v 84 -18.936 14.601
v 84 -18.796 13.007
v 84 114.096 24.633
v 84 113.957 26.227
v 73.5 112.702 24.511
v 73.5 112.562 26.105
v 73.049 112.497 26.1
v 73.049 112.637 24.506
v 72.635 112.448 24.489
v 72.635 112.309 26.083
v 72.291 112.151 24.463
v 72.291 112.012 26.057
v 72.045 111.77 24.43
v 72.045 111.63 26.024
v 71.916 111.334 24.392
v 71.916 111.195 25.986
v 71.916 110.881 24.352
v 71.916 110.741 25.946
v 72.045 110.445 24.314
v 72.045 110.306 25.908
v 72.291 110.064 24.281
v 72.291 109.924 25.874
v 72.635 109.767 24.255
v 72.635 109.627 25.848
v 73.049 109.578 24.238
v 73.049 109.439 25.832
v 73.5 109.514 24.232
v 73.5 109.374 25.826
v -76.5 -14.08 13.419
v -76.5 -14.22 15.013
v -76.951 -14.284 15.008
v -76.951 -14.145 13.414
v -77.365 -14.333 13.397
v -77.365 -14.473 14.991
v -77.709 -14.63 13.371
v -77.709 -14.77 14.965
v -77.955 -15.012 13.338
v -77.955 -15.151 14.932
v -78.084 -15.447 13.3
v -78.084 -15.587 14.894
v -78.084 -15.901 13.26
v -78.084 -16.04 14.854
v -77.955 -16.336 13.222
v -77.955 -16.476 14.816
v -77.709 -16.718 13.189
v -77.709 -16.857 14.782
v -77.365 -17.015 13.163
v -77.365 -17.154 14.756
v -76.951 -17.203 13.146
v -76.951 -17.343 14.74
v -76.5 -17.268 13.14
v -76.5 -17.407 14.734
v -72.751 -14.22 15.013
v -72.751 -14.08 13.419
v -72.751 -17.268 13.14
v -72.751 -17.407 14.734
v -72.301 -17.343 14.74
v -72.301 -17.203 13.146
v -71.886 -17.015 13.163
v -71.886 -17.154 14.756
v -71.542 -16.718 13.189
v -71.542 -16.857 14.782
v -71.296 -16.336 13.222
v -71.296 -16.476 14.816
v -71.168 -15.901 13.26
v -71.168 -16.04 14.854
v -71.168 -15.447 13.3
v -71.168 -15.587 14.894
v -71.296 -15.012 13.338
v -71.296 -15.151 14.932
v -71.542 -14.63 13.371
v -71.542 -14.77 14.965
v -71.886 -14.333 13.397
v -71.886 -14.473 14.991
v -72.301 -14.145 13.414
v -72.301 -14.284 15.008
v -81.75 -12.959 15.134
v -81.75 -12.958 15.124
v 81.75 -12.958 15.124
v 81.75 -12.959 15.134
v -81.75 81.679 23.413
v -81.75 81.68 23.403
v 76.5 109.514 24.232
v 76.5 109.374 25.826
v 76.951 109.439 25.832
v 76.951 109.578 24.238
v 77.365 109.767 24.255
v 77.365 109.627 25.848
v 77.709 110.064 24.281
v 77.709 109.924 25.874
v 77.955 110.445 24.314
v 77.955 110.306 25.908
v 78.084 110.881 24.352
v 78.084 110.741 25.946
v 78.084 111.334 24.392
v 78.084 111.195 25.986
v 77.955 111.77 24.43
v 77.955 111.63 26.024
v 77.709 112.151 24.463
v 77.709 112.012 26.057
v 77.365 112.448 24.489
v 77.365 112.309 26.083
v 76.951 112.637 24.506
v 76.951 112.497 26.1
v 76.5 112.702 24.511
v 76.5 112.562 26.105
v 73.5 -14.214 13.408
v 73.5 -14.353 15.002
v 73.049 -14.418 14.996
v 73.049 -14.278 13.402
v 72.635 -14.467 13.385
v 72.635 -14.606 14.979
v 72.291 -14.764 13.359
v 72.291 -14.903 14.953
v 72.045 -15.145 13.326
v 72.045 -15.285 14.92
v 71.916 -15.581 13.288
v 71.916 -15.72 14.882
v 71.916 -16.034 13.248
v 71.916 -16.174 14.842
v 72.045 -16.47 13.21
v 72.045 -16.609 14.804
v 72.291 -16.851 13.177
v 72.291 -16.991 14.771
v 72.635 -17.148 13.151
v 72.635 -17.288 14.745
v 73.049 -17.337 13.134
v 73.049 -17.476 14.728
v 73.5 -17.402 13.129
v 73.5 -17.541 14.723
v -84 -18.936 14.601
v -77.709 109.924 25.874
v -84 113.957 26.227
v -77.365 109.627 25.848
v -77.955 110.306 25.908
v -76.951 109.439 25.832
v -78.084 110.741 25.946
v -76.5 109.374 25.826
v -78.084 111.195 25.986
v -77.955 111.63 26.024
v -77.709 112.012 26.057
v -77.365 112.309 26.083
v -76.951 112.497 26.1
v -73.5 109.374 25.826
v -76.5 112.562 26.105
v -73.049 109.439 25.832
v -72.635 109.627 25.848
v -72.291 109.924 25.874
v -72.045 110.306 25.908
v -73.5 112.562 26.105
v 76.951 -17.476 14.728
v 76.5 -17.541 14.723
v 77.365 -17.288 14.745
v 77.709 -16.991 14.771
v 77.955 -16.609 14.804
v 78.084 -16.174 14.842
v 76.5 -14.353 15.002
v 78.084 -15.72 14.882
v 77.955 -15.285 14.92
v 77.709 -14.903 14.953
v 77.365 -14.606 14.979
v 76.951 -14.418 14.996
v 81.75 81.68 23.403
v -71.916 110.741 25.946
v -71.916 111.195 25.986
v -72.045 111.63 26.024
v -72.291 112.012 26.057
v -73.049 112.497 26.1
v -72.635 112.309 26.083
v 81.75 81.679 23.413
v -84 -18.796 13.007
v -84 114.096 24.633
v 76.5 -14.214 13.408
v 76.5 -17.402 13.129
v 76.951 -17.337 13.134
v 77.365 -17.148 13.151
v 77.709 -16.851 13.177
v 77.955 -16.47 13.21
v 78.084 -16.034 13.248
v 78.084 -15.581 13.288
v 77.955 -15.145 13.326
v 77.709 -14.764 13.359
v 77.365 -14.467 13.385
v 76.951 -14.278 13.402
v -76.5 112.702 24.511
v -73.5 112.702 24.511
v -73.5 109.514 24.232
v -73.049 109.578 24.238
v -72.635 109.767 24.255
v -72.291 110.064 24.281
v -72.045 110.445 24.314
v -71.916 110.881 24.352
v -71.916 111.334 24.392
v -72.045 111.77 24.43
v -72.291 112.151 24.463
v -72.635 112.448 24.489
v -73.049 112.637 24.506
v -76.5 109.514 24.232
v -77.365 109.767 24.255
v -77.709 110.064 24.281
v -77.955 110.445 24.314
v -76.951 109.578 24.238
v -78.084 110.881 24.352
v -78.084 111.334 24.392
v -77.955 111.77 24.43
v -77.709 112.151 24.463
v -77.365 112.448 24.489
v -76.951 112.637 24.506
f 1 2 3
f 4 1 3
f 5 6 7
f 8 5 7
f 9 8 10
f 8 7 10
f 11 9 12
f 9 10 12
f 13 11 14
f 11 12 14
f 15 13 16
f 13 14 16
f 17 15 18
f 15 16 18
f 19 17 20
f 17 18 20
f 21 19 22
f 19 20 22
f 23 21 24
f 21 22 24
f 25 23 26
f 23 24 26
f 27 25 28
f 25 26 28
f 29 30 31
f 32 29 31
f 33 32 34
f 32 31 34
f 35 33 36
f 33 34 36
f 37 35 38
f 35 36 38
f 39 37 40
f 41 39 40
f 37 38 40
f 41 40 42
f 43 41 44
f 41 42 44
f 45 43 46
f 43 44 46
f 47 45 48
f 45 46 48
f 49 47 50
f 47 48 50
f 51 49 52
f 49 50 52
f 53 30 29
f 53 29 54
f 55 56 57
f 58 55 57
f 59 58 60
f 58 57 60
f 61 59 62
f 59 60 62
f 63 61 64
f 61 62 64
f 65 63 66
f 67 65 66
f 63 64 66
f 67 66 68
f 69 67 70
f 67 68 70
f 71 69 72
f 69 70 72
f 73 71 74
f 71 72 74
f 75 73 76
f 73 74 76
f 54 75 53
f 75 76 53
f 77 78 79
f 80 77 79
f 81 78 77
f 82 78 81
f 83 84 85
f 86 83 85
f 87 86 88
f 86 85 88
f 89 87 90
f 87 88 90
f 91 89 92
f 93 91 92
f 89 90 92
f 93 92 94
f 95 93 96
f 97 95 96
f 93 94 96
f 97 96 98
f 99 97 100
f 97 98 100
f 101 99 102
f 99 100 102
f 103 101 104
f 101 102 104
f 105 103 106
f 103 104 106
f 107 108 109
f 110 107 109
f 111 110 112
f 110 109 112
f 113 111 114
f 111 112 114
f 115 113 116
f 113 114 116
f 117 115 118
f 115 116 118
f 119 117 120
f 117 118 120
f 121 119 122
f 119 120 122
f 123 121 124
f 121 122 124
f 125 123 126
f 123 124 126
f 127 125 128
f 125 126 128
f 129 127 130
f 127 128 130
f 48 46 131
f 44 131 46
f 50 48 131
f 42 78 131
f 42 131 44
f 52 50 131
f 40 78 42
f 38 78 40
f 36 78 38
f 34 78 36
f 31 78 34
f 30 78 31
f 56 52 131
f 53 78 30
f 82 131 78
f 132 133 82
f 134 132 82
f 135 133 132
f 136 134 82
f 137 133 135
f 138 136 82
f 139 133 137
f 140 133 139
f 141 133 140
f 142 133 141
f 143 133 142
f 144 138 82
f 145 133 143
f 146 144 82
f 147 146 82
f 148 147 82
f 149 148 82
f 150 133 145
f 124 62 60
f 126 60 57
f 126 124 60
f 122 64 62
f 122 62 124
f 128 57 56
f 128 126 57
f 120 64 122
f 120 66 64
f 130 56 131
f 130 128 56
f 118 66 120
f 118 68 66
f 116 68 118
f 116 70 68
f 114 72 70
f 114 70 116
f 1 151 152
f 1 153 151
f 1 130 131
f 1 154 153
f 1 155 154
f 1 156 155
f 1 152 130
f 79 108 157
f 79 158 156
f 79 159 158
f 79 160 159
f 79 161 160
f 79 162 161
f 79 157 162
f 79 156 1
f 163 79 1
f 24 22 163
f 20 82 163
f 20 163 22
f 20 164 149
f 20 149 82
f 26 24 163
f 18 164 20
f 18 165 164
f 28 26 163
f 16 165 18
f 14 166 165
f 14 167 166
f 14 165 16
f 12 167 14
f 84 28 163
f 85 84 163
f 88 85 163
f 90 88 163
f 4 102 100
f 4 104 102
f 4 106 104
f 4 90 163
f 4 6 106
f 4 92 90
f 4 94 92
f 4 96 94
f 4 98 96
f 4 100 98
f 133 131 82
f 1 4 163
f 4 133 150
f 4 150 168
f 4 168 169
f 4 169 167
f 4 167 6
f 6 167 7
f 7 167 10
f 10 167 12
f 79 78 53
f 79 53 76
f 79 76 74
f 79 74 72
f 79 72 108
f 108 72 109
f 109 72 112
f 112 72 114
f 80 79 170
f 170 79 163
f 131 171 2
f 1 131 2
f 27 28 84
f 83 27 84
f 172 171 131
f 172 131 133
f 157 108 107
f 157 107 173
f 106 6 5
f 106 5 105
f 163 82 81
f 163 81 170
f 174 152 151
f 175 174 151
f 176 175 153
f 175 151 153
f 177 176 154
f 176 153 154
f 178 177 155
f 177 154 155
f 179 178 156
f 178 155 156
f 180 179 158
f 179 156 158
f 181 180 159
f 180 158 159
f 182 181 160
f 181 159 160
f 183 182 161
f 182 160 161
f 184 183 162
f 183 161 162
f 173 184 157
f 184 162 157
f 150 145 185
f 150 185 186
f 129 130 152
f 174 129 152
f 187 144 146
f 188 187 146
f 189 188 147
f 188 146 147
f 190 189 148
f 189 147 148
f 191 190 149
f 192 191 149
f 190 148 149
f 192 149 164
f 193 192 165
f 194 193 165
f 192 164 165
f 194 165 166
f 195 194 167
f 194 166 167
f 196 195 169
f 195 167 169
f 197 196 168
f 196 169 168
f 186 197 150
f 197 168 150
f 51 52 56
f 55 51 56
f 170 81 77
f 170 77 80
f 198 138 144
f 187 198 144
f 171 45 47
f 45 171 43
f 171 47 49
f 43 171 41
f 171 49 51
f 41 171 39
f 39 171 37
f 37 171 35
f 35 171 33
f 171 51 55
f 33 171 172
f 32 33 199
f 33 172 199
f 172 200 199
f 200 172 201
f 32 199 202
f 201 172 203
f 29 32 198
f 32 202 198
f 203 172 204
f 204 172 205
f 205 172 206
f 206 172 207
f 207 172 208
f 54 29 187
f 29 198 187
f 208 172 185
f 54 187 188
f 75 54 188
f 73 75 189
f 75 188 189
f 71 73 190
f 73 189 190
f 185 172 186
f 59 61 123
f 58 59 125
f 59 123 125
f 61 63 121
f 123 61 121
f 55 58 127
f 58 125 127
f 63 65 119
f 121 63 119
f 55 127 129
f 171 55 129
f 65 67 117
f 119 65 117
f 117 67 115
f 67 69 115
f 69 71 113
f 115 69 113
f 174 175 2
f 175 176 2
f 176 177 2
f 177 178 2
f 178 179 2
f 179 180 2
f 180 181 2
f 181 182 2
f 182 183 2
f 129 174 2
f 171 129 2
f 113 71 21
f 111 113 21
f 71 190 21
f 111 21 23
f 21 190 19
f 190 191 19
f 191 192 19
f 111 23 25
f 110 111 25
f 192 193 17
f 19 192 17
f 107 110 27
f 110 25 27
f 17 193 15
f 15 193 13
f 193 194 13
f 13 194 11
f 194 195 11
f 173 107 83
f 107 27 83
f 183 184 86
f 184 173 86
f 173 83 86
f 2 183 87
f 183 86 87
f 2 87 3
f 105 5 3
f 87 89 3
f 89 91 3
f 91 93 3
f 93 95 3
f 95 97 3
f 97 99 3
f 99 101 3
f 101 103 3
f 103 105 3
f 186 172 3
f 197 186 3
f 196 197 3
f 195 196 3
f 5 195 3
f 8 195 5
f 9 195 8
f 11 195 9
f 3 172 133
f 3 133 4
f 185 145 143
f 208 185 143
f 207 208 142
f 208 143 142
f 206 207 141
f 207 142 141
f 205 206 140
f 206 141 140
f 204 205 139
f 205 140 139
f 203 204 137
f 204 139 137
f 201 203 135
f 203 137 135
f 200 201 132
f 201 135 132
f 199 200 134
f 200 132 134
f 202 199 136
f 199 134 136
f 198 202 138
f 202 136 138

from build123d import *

# Parameters (mm, degrees)
SKETCH_W        = 168
SKETCH_H        = 133.4
PAD_DEPTH       = 1.6
SKETCH001_W     = 163.5
SKETCH001_H     = 95
PAD001_DEPTH    = 0.01
POCKET_DEPTH    = 1.601
POCKET001_DEPTH = 1.601
BODY_ROLL_ANGLE = 5


with BuildPart() as part:
    # Sketch → Pad (new body)
    with BuildSketch(Plane.XY):
        Rectangle(SKETCH_W, SKETCH_H)
    extrude(amount=PAD_DEPTH)

    # Sketch001 (on Face6 of Pad) → Pad001 (join)
    with BuildSketch(Plane.XY.offset(1.6)):
        with Locations((0, -13.2)):
            Rectangle(SKETCH001_W, SKETCH001_H)
    extrude(amount=PAD001_DEPTH)

    # Sketch002 (on Face5 of Pad001) → Pocket (cut, through all)
    with BuildSketch(Plane.XY.offset(1.6)):
        with BuildLine():
            ThreePointArc((-76.5, -61.965896), (-78.1, -63.565896), (-76.5, -65.165896))
            Line((-76.5, -65.165896), (-72.75134, -65.165896))
            ThreePointArc((-72.75134, -65.165896), (-71.15134, -63.565896), (-72.75134, -61.965896))
            Line((-76.5, -61.965896), (-72.75134, -61.965896))
        make_face()
    extrude(amount=-POCKET_DEPTH, mode=Mode.SUBTRACT)

    # Sketch003 (on Face5 of Pocket) → Pocket001 (cut, through all)
    with BuildSketch(Plane.XY.offset(1.6)):
        with BuildLine():
            ThreePointArc((73.5, -62.1), (71.9, -63.7), (73.5, -65.3))
            Line((73.5, -65.3), (76.5, -65.3))
            ThreePointArc((76.5, -65.3), (78.1, -63.7), (76.5, -62.1))
            Line((73.5, -62.1), (76.5, -62.1))
        make_face()
        with BuildLine():
            ThreePointArc((73.5, 65.3), (71.9, 63.7), (73.5, 62.1))
            Line((73.5, 62.1), (76.5, 62.1))
            ThreePointArc((76.5, 62.1), (78.1, 63.7), (76.5, 65.3))
            Line((73.5, 65.3), (76.5, 65.3))
        make_face()
        with BuildLine():
            ThreePointArc((-76.5, 65.3), (-78.1, 63.7), (-76.5, 62.1))
            Line((-76.5, 62.1), (-73.5, 62.1))
            ThreePointArc((-73.5, 62.1), (-71.9, 63.7), (-73.5, 65.3))
            Line((-76.5, 65.3), (-73.5, 65.3))
        make_face()
    extrude(amount=-POCKET001_DEPTH, mode=Mode.SUBTRACT)


with BuildPart() as part_1:
    # Body roll: moved
    add(part.part.rotate(Axis((0, 0, 0), (1, 0, 0)), BODY_ROLL_ANGLE))


with BuildPart() as part_2:
    # Body placement: moved
    add(part_1.part.moved(Location((0, 47.65, 18.82))))


solid = part_2.part
